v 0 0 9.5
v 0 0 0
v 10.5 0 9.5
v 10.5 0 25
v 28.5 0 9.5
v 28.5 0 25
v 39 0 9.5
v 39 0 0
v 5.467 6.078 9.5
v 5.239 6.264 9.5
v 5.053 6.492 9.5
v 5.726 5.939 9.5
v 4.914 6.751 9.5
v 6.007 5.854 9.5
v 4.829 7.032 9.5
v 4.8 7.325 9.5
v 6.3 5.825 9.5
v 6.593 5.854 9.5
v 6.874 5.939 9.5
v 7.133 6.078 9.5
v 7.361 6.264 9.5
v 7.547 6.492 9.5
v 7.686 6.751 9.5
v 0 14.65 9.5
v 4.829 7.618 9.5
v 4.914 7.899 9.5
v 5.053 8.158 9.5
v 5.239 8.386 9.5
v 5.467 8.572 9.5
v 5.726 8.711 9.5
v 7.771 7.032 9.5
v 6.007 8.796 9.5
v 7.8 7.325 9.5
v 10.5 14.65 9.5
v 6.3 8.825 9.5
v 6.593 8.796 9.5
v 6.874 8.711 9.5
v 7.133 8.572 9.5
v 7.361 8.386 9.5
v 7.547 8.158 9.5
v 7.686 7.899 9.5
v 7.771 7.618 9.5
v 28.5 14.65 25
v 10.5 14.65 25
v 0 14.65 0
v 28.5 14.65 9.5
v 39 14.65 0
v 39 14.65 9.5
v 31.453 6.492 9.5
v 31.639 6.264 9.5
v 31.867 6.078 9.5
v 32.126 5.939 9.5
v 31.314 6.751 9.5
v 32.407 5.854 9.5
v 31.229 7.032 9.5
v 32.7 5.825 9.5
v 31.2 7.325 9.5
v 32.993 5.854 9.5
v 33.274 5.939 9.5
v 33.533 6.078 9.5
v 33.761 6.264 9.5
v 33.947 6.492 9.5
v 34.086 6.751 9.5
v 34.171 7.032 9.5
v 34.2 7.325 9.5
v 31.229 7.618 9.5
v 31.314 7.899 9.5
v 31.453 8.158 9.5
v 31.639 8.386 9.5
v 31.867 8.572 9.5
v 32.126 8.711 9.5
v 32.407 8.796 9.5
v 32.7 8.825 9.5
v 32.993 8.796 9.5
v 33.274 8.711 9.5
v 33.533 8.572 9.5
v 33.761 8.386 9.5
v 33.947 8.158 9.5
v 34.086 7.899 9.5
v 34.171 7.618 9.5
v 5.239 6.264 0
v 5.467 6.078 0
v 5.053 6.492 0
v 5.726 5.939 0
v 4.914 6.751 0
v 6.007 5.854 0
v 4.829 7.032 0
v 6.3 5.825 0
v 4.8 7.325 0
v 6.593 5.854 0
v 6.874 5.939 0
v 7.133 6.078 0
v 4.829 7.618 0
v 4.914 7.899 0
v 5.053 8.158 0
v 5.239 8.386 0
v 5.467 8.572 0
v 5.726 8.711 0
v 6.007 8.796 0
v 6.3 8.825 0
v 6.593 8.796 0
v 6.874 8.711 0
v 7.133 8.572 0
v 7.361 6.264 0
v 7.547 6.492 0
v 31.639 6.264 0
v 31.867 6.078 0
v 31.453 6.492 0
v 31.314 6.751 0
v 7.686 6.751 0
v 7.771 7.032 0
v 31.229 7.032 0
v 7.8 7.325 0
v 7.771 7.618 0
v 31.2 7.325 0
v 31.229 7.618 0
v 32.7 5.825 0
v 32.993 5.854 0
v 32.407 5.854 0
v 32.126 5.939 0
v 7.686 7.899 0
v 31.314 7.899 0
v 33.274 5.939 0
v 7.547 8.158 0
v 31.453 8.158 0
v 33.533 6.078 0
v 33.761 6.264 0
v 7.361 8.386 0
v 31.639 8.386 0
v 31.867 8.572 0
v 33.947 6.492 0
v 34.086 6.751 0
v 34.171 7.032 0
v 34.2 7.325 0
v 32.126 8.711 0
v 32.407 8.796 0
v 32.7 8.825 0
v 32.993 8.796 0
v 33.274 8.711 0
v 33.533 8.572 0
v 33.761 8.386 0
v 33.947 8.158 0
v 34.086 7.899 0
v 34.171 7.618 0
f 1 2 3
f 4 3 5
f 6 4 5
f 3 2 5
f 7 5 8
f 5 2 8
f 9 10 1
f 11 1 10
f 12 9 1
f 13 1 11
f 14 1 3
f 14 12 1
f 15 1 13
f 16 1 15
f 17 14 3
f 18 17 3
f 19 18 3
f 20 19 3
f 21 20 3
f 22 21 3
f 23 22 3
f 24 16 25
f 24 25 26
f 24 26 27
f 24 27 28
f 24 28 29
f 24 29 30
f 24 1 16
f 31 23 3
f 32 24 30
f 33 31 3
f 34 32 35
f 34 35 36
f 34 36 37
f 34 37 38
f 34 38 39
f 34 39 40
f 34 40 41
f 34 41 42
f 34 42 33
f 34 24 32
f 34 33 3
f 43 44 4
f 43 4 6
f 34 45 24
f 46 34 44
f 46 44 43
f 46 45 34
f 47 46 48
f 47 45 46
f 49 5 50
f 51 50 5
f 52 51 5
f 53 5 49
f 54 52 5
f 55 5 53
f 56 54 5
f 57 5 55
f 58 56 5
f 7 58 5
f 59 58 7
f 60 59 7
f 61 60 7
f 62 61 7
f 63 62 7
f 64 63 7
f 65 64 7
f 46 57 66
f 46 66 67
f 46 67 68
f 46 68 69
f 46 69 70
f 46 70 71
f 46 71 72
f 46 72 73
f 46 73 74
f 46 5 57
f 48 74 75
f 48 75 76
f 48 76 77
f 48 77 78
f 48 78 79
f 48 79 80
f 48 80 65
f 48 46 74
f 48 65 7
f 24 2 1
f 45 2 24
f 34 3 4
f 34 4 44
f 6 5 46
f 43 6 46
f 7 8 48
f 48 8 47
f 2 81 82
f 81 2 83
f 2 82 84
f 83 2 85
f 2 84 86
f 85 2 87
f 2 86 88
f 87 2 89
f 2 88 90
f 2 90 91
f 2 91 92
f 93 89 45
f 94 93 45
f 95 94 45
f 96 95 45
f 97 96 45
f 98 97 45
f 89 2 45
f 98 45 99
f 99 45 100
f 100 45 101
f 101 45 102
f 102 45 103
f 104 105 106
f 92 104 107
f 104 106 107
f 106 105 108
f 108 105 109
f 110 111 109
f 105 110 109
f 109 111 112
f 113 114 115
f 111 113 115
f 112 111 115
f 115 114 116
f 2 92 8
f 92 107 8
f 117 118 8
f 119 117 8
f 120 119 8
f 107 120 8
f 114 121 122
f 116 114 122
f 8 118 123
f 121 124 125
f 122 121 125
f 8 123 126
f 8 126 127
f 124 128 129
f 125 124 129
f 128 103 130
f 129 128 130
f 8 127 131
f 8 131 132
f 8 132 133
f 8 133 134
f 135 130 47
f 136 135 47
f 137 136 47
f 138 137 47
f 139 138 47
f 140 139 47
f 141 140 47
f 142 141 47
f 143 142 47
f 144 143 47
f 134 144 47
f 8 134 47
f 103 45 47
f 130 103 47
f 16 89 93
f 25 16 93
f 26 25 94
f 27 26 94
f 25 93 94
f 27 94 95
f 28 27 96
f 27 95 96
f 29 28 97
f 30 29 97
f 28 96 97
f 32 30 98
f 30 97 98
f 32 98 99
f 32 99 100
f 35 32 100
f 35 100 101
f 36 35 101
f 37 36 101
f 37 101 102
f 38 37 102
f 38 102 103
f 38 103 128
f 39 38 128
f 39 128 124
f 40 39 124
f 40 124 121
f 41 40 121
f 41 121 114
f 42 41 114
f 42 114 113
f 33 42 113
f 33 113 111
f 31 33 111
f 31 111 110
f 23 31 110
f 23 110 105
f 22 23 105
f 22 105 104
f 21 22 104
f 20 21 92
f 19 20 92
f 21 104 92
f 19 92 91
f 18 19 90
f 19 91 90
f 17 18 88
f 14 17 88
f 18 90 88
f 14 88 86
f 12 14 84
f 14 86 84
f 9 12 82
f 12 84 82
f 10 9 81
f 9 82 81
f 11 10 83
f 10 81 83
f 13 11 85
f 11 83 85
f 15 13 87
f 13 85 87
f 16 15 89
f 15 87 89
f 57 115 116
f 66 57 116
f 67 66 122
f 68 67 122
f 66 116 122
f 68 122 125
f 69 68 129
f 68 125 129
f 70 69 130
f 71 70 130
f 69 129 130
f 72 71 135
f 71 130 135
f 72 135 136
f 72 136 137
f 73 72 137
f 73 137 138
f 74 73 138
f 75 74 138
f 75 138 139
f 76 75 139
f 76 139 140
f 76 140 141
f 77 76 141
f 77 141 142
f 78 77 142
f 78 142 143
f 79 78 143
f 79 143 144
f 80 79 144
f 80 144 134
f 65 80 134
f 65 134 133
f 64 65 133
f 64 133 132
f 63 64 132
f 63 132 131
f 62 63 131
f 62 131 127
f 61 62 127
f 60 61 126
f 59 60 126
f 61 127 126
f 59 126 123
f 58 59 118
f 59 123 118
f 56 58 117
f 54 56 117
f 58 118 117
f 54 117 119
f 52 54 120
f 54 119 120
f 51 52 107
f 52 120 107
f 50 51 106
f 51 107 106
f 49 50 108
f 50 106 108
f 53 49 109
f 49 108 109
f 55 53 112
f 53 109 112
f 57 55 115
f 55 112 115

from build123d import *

# Parameters (mm, degrees)
SKETCH1_W           = 39
SKETCH1_H           = 14.65
BOSS_EXTRUDE1_DEPTH = 9.5
SKETCH2_W           = 18
SKETCH2_H           = 14.65
BOSS_EXTRUDE2_DEPTH = 15.5
SKETCH3_R           = 1.5
CUT_EXTRUDE1_DEPTH  = 15.5


with BuildPart() as part:
    # Sketch1 → Boss-Extrude1 (new body)
    with BuildSketch(Plane.XY):
        with Locations((19.5, 7.325)):
            Rectangle(SKETCH1_W, SKETCH1_H)
    extrude(amount=BOSS_EXTRUDE1_DEPTH)

    # Sketch2 → Boss-Extrude2 (add)
    with BuildSketch(Plane.XY.offset(9.5)):
        with Locations((19.5, 7.325)):
            Rectangle(SKETCH2_W, SKETCH2_H)
    extrude(amount=BOSS_EXTRUDE2_DEPTH)

    # Sketch3 → Cut-Extrude1 (cut)
    with BuildSketch(Plane(origin=(0, 0, 0), x_dir=(-1, 0, 0), z_dir=(0, 0, -1))):
        with Locations((-32.7, 7.325)):
            Circle(SKETCH3_R)
        with Locations((-6.3, 7.325)):
            Circle(SKETCH3_R)
    extrude(amount=-CUT_EXTRUDE1_DEPTH, mode=Mode.SUBTRACT)


solid = part.part
